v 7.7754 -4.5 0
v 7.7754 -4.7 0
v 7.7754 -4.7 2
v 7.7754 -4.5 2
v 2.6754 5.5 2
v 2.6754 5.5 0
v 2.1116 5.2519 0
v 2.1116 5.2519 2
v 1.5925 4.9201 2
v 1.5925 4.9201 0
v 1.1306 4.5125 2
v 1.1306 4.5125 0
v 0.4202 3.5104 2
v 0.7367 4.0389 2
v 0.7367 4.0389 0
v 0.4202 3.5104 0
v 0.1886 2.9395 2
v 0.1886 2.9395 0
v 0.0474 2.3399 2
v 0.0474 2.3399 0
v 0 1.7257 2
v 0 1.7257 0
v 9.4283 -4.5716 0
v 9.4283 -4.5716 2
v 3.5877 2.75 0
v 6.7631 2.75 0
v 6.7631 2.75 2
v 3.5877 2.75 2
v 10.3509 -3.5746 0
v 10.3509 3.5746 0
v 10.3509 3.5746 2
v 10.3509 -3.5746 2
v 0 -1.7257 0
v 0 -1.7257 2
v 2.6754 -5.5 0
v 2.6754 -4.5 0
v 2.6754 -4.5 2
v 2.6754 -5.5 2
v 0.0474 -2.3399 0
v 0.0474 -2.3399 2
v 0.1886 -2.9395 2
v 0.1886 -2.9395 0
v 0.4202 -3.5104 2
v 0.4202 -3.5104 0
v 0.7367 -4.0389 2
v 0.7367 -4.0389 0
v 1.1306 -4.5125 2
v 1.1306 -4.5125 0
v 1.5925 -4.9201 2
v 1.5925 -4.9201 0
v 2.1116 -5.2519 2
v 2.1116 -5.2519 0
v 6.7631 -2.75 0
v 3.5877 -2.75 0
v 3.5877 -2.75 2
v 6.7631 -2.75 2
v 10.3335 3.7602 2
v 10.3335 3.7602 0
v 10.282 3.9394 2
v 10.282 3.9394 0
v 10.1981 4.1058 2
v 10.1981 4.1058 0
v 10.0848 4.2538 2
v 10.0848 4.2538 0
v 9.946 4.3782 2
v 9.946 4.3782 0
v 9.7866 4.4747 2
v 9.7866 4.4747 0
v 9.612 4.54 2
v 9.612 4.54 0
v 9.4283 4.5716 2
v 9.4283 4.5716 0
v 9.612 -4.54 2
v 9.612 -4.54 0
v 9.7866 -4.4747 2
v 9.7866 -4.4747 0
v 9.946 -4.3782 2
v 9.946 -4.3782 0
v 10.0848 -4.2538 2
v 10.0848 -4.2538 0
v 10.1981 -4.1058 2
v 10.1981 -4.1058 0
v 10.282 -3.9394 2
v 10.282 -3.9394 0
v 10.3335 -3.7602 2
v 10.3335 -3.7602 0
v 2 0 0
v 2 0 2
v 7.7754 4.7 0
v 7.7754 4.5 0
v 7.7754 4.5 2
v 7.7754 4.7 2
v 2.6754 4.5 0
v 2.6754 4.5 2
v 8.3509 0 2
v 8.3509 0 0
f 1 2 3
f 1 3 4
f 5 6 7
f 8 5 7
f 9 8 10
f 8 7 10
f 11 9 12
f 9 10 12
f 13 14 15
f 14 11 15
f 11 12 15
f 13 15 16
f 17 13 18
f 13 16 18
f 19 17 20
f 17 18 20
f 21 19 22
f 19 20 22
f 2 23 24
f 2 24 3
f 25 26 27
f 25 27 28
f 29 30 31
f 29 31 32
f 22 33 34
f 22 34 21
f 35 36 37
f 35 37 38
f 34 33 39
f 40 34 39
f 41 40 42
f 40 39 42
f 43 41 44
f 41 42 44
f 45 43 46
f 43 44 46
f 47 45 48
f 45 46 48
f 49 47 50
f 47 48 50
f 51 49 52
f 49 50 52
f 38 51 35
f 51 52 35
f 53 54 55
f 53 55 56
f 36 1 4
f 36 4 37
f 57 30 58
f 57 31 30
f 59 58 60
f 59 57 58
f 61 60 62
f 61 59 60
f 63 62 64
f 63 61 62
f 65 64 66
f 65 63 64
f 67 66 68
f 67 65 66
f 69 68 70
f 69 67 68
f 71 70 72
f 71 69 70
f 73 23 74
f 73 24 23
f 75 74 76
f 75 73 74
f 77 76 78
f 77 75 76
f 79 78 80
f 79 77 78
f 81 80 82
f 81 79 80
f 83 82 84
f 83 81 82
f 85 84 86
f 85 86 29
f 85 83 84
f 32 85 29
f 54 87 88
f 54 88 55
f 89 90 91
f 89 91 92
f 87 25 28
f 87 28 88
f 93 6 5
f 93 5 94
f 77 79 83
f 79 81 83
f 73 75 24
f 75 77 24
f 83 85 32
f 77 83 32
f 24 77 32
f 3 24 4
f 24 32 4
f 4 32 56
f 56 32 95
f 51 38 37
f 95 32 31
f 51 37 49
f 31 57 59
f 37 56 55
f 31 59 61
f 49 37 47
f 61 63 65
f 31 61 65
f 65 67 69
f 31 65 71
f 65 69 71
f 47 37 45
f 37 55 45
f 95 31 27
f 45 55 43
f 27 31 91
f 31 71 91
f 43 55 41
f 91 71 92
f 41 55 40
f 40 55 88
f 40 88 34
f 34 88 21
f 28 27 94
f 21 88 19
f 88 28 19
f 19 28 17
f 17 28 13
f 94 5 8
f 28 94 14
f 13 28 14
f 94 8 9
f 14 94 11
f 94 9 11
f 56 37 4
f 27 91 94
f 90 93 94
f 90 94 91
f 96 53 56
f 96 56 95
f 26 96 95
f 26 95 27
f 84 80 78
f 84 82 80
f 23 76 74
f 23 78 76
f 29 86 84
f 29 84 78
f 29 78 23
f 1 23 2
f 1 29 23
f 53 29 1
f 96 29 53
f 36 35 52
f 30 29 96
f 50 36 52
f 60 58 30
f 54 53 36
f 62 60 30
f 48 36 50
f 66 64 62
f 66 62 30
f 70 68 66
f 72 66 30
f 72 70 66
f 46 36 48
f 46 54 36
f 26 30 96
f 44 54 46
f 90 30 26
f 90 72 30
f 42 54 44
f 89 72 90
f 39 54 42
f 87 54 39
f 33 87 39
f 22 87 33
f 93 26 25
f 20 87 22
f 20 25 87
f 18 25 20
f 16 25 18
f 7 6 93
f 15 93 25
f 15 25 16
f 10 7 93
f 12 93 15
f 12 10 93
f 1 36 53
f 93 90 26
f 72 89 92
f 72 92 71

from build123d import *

# Parameters (mm, degrees)
BOSS_EXTRU_1_DEPTH = 2
CONG_1_R           = 4
CONG_2_R           = 1


with BuildPart() as part:
    # Esquisse1 → Boss.-Extru.1 (new body)
    with BuildSketch(Plane.XY):
        Polygon((0, 5.5), (2.675426481, 5.5), (2.675426481, 4.5), (7.775426481, 4.5), (7.775426481, 4.7), (10.350852961, 4.5), (10.350852961, -4.5), (7.775426481, -4.7), (7.775426481, -4.5), (2.675426481, -4.5), (2.675426481, -5.5), (0, -5.5), align=None)
        Polygon((2, 0), (3.58771324, -2.75), (6.763139721, -2.75), (8.350852961, 0), (6.763139721, 2.75), (3.58771324, 2.75), align=None, mode=Mode.SUBTRACT)
    extrude(amount=BOSS_EXTRU_1_DEPTH)

    # Congé1
    # the kernel refuses this fillet: 4 mm, written as the material it takes off along each edge
    with BuildSketch(Plane(origin=(0, -5.5, -9.435804481), x_dir=(1, 0, 0), z_dir=(0, 0, 1))) as cong_1_piece_1:
        with BuildLine():
            CenterArc((4, 3.774321792), CONG_1_R, 180, 70.661811314)
            Line((0, 3.774321792), (-0.08, 3.774321792))
            Line((-0.08, 3.774321792), (-0.08, 0))
            Line((-0.08, 0), (0, -0.08))
            ThreePointArc((0, -0.08), (1.33771324, -0.08), (2.64893501, -0.075486436))
            Line((2.64893501, -0.075486436), (2.675426481, 0))
        make_face()
    extrude(amount=20.871608961, mode=Mode.SUBTRACT)
    with BuildSketch(Plane(origin=(0, 5.5, -9.435804481), x_dir=(1, 0, 0), z_dir=(0, 0, 1))) as cong_1_piece_2:
        with BuildLine():
            CenterArc((4, -3.774321792), CONG_1_R, 109.338188686, 70.661811314)
            Line((0, -3.774321792), (-0.08, -3.774321792))
            Line((-0.08, -3.774321792), (-0.08, 0))
            Line((-0.08, 0), (0, 0.08))
            ThreePointArc((0, 0.08), (1.33771324, 0.08), (2.64893501, 0.075486436))
            Line((2.64893501, 0.075486436), (2.675426481, 0))
        make_face()
    extrude(amount=20.871608961, mode=Mode.SUBTRACT)

    # Congé2
    cong_2_edges = [part.edges().sort_by_distance(p)[0] for p in [
        (10.350852961, 4.5, 1),
        (10.350852961, -4.5, 1),
    ]]
    fillet(cong_2_edges, radius=CONG_2_R)


solid = part.part
